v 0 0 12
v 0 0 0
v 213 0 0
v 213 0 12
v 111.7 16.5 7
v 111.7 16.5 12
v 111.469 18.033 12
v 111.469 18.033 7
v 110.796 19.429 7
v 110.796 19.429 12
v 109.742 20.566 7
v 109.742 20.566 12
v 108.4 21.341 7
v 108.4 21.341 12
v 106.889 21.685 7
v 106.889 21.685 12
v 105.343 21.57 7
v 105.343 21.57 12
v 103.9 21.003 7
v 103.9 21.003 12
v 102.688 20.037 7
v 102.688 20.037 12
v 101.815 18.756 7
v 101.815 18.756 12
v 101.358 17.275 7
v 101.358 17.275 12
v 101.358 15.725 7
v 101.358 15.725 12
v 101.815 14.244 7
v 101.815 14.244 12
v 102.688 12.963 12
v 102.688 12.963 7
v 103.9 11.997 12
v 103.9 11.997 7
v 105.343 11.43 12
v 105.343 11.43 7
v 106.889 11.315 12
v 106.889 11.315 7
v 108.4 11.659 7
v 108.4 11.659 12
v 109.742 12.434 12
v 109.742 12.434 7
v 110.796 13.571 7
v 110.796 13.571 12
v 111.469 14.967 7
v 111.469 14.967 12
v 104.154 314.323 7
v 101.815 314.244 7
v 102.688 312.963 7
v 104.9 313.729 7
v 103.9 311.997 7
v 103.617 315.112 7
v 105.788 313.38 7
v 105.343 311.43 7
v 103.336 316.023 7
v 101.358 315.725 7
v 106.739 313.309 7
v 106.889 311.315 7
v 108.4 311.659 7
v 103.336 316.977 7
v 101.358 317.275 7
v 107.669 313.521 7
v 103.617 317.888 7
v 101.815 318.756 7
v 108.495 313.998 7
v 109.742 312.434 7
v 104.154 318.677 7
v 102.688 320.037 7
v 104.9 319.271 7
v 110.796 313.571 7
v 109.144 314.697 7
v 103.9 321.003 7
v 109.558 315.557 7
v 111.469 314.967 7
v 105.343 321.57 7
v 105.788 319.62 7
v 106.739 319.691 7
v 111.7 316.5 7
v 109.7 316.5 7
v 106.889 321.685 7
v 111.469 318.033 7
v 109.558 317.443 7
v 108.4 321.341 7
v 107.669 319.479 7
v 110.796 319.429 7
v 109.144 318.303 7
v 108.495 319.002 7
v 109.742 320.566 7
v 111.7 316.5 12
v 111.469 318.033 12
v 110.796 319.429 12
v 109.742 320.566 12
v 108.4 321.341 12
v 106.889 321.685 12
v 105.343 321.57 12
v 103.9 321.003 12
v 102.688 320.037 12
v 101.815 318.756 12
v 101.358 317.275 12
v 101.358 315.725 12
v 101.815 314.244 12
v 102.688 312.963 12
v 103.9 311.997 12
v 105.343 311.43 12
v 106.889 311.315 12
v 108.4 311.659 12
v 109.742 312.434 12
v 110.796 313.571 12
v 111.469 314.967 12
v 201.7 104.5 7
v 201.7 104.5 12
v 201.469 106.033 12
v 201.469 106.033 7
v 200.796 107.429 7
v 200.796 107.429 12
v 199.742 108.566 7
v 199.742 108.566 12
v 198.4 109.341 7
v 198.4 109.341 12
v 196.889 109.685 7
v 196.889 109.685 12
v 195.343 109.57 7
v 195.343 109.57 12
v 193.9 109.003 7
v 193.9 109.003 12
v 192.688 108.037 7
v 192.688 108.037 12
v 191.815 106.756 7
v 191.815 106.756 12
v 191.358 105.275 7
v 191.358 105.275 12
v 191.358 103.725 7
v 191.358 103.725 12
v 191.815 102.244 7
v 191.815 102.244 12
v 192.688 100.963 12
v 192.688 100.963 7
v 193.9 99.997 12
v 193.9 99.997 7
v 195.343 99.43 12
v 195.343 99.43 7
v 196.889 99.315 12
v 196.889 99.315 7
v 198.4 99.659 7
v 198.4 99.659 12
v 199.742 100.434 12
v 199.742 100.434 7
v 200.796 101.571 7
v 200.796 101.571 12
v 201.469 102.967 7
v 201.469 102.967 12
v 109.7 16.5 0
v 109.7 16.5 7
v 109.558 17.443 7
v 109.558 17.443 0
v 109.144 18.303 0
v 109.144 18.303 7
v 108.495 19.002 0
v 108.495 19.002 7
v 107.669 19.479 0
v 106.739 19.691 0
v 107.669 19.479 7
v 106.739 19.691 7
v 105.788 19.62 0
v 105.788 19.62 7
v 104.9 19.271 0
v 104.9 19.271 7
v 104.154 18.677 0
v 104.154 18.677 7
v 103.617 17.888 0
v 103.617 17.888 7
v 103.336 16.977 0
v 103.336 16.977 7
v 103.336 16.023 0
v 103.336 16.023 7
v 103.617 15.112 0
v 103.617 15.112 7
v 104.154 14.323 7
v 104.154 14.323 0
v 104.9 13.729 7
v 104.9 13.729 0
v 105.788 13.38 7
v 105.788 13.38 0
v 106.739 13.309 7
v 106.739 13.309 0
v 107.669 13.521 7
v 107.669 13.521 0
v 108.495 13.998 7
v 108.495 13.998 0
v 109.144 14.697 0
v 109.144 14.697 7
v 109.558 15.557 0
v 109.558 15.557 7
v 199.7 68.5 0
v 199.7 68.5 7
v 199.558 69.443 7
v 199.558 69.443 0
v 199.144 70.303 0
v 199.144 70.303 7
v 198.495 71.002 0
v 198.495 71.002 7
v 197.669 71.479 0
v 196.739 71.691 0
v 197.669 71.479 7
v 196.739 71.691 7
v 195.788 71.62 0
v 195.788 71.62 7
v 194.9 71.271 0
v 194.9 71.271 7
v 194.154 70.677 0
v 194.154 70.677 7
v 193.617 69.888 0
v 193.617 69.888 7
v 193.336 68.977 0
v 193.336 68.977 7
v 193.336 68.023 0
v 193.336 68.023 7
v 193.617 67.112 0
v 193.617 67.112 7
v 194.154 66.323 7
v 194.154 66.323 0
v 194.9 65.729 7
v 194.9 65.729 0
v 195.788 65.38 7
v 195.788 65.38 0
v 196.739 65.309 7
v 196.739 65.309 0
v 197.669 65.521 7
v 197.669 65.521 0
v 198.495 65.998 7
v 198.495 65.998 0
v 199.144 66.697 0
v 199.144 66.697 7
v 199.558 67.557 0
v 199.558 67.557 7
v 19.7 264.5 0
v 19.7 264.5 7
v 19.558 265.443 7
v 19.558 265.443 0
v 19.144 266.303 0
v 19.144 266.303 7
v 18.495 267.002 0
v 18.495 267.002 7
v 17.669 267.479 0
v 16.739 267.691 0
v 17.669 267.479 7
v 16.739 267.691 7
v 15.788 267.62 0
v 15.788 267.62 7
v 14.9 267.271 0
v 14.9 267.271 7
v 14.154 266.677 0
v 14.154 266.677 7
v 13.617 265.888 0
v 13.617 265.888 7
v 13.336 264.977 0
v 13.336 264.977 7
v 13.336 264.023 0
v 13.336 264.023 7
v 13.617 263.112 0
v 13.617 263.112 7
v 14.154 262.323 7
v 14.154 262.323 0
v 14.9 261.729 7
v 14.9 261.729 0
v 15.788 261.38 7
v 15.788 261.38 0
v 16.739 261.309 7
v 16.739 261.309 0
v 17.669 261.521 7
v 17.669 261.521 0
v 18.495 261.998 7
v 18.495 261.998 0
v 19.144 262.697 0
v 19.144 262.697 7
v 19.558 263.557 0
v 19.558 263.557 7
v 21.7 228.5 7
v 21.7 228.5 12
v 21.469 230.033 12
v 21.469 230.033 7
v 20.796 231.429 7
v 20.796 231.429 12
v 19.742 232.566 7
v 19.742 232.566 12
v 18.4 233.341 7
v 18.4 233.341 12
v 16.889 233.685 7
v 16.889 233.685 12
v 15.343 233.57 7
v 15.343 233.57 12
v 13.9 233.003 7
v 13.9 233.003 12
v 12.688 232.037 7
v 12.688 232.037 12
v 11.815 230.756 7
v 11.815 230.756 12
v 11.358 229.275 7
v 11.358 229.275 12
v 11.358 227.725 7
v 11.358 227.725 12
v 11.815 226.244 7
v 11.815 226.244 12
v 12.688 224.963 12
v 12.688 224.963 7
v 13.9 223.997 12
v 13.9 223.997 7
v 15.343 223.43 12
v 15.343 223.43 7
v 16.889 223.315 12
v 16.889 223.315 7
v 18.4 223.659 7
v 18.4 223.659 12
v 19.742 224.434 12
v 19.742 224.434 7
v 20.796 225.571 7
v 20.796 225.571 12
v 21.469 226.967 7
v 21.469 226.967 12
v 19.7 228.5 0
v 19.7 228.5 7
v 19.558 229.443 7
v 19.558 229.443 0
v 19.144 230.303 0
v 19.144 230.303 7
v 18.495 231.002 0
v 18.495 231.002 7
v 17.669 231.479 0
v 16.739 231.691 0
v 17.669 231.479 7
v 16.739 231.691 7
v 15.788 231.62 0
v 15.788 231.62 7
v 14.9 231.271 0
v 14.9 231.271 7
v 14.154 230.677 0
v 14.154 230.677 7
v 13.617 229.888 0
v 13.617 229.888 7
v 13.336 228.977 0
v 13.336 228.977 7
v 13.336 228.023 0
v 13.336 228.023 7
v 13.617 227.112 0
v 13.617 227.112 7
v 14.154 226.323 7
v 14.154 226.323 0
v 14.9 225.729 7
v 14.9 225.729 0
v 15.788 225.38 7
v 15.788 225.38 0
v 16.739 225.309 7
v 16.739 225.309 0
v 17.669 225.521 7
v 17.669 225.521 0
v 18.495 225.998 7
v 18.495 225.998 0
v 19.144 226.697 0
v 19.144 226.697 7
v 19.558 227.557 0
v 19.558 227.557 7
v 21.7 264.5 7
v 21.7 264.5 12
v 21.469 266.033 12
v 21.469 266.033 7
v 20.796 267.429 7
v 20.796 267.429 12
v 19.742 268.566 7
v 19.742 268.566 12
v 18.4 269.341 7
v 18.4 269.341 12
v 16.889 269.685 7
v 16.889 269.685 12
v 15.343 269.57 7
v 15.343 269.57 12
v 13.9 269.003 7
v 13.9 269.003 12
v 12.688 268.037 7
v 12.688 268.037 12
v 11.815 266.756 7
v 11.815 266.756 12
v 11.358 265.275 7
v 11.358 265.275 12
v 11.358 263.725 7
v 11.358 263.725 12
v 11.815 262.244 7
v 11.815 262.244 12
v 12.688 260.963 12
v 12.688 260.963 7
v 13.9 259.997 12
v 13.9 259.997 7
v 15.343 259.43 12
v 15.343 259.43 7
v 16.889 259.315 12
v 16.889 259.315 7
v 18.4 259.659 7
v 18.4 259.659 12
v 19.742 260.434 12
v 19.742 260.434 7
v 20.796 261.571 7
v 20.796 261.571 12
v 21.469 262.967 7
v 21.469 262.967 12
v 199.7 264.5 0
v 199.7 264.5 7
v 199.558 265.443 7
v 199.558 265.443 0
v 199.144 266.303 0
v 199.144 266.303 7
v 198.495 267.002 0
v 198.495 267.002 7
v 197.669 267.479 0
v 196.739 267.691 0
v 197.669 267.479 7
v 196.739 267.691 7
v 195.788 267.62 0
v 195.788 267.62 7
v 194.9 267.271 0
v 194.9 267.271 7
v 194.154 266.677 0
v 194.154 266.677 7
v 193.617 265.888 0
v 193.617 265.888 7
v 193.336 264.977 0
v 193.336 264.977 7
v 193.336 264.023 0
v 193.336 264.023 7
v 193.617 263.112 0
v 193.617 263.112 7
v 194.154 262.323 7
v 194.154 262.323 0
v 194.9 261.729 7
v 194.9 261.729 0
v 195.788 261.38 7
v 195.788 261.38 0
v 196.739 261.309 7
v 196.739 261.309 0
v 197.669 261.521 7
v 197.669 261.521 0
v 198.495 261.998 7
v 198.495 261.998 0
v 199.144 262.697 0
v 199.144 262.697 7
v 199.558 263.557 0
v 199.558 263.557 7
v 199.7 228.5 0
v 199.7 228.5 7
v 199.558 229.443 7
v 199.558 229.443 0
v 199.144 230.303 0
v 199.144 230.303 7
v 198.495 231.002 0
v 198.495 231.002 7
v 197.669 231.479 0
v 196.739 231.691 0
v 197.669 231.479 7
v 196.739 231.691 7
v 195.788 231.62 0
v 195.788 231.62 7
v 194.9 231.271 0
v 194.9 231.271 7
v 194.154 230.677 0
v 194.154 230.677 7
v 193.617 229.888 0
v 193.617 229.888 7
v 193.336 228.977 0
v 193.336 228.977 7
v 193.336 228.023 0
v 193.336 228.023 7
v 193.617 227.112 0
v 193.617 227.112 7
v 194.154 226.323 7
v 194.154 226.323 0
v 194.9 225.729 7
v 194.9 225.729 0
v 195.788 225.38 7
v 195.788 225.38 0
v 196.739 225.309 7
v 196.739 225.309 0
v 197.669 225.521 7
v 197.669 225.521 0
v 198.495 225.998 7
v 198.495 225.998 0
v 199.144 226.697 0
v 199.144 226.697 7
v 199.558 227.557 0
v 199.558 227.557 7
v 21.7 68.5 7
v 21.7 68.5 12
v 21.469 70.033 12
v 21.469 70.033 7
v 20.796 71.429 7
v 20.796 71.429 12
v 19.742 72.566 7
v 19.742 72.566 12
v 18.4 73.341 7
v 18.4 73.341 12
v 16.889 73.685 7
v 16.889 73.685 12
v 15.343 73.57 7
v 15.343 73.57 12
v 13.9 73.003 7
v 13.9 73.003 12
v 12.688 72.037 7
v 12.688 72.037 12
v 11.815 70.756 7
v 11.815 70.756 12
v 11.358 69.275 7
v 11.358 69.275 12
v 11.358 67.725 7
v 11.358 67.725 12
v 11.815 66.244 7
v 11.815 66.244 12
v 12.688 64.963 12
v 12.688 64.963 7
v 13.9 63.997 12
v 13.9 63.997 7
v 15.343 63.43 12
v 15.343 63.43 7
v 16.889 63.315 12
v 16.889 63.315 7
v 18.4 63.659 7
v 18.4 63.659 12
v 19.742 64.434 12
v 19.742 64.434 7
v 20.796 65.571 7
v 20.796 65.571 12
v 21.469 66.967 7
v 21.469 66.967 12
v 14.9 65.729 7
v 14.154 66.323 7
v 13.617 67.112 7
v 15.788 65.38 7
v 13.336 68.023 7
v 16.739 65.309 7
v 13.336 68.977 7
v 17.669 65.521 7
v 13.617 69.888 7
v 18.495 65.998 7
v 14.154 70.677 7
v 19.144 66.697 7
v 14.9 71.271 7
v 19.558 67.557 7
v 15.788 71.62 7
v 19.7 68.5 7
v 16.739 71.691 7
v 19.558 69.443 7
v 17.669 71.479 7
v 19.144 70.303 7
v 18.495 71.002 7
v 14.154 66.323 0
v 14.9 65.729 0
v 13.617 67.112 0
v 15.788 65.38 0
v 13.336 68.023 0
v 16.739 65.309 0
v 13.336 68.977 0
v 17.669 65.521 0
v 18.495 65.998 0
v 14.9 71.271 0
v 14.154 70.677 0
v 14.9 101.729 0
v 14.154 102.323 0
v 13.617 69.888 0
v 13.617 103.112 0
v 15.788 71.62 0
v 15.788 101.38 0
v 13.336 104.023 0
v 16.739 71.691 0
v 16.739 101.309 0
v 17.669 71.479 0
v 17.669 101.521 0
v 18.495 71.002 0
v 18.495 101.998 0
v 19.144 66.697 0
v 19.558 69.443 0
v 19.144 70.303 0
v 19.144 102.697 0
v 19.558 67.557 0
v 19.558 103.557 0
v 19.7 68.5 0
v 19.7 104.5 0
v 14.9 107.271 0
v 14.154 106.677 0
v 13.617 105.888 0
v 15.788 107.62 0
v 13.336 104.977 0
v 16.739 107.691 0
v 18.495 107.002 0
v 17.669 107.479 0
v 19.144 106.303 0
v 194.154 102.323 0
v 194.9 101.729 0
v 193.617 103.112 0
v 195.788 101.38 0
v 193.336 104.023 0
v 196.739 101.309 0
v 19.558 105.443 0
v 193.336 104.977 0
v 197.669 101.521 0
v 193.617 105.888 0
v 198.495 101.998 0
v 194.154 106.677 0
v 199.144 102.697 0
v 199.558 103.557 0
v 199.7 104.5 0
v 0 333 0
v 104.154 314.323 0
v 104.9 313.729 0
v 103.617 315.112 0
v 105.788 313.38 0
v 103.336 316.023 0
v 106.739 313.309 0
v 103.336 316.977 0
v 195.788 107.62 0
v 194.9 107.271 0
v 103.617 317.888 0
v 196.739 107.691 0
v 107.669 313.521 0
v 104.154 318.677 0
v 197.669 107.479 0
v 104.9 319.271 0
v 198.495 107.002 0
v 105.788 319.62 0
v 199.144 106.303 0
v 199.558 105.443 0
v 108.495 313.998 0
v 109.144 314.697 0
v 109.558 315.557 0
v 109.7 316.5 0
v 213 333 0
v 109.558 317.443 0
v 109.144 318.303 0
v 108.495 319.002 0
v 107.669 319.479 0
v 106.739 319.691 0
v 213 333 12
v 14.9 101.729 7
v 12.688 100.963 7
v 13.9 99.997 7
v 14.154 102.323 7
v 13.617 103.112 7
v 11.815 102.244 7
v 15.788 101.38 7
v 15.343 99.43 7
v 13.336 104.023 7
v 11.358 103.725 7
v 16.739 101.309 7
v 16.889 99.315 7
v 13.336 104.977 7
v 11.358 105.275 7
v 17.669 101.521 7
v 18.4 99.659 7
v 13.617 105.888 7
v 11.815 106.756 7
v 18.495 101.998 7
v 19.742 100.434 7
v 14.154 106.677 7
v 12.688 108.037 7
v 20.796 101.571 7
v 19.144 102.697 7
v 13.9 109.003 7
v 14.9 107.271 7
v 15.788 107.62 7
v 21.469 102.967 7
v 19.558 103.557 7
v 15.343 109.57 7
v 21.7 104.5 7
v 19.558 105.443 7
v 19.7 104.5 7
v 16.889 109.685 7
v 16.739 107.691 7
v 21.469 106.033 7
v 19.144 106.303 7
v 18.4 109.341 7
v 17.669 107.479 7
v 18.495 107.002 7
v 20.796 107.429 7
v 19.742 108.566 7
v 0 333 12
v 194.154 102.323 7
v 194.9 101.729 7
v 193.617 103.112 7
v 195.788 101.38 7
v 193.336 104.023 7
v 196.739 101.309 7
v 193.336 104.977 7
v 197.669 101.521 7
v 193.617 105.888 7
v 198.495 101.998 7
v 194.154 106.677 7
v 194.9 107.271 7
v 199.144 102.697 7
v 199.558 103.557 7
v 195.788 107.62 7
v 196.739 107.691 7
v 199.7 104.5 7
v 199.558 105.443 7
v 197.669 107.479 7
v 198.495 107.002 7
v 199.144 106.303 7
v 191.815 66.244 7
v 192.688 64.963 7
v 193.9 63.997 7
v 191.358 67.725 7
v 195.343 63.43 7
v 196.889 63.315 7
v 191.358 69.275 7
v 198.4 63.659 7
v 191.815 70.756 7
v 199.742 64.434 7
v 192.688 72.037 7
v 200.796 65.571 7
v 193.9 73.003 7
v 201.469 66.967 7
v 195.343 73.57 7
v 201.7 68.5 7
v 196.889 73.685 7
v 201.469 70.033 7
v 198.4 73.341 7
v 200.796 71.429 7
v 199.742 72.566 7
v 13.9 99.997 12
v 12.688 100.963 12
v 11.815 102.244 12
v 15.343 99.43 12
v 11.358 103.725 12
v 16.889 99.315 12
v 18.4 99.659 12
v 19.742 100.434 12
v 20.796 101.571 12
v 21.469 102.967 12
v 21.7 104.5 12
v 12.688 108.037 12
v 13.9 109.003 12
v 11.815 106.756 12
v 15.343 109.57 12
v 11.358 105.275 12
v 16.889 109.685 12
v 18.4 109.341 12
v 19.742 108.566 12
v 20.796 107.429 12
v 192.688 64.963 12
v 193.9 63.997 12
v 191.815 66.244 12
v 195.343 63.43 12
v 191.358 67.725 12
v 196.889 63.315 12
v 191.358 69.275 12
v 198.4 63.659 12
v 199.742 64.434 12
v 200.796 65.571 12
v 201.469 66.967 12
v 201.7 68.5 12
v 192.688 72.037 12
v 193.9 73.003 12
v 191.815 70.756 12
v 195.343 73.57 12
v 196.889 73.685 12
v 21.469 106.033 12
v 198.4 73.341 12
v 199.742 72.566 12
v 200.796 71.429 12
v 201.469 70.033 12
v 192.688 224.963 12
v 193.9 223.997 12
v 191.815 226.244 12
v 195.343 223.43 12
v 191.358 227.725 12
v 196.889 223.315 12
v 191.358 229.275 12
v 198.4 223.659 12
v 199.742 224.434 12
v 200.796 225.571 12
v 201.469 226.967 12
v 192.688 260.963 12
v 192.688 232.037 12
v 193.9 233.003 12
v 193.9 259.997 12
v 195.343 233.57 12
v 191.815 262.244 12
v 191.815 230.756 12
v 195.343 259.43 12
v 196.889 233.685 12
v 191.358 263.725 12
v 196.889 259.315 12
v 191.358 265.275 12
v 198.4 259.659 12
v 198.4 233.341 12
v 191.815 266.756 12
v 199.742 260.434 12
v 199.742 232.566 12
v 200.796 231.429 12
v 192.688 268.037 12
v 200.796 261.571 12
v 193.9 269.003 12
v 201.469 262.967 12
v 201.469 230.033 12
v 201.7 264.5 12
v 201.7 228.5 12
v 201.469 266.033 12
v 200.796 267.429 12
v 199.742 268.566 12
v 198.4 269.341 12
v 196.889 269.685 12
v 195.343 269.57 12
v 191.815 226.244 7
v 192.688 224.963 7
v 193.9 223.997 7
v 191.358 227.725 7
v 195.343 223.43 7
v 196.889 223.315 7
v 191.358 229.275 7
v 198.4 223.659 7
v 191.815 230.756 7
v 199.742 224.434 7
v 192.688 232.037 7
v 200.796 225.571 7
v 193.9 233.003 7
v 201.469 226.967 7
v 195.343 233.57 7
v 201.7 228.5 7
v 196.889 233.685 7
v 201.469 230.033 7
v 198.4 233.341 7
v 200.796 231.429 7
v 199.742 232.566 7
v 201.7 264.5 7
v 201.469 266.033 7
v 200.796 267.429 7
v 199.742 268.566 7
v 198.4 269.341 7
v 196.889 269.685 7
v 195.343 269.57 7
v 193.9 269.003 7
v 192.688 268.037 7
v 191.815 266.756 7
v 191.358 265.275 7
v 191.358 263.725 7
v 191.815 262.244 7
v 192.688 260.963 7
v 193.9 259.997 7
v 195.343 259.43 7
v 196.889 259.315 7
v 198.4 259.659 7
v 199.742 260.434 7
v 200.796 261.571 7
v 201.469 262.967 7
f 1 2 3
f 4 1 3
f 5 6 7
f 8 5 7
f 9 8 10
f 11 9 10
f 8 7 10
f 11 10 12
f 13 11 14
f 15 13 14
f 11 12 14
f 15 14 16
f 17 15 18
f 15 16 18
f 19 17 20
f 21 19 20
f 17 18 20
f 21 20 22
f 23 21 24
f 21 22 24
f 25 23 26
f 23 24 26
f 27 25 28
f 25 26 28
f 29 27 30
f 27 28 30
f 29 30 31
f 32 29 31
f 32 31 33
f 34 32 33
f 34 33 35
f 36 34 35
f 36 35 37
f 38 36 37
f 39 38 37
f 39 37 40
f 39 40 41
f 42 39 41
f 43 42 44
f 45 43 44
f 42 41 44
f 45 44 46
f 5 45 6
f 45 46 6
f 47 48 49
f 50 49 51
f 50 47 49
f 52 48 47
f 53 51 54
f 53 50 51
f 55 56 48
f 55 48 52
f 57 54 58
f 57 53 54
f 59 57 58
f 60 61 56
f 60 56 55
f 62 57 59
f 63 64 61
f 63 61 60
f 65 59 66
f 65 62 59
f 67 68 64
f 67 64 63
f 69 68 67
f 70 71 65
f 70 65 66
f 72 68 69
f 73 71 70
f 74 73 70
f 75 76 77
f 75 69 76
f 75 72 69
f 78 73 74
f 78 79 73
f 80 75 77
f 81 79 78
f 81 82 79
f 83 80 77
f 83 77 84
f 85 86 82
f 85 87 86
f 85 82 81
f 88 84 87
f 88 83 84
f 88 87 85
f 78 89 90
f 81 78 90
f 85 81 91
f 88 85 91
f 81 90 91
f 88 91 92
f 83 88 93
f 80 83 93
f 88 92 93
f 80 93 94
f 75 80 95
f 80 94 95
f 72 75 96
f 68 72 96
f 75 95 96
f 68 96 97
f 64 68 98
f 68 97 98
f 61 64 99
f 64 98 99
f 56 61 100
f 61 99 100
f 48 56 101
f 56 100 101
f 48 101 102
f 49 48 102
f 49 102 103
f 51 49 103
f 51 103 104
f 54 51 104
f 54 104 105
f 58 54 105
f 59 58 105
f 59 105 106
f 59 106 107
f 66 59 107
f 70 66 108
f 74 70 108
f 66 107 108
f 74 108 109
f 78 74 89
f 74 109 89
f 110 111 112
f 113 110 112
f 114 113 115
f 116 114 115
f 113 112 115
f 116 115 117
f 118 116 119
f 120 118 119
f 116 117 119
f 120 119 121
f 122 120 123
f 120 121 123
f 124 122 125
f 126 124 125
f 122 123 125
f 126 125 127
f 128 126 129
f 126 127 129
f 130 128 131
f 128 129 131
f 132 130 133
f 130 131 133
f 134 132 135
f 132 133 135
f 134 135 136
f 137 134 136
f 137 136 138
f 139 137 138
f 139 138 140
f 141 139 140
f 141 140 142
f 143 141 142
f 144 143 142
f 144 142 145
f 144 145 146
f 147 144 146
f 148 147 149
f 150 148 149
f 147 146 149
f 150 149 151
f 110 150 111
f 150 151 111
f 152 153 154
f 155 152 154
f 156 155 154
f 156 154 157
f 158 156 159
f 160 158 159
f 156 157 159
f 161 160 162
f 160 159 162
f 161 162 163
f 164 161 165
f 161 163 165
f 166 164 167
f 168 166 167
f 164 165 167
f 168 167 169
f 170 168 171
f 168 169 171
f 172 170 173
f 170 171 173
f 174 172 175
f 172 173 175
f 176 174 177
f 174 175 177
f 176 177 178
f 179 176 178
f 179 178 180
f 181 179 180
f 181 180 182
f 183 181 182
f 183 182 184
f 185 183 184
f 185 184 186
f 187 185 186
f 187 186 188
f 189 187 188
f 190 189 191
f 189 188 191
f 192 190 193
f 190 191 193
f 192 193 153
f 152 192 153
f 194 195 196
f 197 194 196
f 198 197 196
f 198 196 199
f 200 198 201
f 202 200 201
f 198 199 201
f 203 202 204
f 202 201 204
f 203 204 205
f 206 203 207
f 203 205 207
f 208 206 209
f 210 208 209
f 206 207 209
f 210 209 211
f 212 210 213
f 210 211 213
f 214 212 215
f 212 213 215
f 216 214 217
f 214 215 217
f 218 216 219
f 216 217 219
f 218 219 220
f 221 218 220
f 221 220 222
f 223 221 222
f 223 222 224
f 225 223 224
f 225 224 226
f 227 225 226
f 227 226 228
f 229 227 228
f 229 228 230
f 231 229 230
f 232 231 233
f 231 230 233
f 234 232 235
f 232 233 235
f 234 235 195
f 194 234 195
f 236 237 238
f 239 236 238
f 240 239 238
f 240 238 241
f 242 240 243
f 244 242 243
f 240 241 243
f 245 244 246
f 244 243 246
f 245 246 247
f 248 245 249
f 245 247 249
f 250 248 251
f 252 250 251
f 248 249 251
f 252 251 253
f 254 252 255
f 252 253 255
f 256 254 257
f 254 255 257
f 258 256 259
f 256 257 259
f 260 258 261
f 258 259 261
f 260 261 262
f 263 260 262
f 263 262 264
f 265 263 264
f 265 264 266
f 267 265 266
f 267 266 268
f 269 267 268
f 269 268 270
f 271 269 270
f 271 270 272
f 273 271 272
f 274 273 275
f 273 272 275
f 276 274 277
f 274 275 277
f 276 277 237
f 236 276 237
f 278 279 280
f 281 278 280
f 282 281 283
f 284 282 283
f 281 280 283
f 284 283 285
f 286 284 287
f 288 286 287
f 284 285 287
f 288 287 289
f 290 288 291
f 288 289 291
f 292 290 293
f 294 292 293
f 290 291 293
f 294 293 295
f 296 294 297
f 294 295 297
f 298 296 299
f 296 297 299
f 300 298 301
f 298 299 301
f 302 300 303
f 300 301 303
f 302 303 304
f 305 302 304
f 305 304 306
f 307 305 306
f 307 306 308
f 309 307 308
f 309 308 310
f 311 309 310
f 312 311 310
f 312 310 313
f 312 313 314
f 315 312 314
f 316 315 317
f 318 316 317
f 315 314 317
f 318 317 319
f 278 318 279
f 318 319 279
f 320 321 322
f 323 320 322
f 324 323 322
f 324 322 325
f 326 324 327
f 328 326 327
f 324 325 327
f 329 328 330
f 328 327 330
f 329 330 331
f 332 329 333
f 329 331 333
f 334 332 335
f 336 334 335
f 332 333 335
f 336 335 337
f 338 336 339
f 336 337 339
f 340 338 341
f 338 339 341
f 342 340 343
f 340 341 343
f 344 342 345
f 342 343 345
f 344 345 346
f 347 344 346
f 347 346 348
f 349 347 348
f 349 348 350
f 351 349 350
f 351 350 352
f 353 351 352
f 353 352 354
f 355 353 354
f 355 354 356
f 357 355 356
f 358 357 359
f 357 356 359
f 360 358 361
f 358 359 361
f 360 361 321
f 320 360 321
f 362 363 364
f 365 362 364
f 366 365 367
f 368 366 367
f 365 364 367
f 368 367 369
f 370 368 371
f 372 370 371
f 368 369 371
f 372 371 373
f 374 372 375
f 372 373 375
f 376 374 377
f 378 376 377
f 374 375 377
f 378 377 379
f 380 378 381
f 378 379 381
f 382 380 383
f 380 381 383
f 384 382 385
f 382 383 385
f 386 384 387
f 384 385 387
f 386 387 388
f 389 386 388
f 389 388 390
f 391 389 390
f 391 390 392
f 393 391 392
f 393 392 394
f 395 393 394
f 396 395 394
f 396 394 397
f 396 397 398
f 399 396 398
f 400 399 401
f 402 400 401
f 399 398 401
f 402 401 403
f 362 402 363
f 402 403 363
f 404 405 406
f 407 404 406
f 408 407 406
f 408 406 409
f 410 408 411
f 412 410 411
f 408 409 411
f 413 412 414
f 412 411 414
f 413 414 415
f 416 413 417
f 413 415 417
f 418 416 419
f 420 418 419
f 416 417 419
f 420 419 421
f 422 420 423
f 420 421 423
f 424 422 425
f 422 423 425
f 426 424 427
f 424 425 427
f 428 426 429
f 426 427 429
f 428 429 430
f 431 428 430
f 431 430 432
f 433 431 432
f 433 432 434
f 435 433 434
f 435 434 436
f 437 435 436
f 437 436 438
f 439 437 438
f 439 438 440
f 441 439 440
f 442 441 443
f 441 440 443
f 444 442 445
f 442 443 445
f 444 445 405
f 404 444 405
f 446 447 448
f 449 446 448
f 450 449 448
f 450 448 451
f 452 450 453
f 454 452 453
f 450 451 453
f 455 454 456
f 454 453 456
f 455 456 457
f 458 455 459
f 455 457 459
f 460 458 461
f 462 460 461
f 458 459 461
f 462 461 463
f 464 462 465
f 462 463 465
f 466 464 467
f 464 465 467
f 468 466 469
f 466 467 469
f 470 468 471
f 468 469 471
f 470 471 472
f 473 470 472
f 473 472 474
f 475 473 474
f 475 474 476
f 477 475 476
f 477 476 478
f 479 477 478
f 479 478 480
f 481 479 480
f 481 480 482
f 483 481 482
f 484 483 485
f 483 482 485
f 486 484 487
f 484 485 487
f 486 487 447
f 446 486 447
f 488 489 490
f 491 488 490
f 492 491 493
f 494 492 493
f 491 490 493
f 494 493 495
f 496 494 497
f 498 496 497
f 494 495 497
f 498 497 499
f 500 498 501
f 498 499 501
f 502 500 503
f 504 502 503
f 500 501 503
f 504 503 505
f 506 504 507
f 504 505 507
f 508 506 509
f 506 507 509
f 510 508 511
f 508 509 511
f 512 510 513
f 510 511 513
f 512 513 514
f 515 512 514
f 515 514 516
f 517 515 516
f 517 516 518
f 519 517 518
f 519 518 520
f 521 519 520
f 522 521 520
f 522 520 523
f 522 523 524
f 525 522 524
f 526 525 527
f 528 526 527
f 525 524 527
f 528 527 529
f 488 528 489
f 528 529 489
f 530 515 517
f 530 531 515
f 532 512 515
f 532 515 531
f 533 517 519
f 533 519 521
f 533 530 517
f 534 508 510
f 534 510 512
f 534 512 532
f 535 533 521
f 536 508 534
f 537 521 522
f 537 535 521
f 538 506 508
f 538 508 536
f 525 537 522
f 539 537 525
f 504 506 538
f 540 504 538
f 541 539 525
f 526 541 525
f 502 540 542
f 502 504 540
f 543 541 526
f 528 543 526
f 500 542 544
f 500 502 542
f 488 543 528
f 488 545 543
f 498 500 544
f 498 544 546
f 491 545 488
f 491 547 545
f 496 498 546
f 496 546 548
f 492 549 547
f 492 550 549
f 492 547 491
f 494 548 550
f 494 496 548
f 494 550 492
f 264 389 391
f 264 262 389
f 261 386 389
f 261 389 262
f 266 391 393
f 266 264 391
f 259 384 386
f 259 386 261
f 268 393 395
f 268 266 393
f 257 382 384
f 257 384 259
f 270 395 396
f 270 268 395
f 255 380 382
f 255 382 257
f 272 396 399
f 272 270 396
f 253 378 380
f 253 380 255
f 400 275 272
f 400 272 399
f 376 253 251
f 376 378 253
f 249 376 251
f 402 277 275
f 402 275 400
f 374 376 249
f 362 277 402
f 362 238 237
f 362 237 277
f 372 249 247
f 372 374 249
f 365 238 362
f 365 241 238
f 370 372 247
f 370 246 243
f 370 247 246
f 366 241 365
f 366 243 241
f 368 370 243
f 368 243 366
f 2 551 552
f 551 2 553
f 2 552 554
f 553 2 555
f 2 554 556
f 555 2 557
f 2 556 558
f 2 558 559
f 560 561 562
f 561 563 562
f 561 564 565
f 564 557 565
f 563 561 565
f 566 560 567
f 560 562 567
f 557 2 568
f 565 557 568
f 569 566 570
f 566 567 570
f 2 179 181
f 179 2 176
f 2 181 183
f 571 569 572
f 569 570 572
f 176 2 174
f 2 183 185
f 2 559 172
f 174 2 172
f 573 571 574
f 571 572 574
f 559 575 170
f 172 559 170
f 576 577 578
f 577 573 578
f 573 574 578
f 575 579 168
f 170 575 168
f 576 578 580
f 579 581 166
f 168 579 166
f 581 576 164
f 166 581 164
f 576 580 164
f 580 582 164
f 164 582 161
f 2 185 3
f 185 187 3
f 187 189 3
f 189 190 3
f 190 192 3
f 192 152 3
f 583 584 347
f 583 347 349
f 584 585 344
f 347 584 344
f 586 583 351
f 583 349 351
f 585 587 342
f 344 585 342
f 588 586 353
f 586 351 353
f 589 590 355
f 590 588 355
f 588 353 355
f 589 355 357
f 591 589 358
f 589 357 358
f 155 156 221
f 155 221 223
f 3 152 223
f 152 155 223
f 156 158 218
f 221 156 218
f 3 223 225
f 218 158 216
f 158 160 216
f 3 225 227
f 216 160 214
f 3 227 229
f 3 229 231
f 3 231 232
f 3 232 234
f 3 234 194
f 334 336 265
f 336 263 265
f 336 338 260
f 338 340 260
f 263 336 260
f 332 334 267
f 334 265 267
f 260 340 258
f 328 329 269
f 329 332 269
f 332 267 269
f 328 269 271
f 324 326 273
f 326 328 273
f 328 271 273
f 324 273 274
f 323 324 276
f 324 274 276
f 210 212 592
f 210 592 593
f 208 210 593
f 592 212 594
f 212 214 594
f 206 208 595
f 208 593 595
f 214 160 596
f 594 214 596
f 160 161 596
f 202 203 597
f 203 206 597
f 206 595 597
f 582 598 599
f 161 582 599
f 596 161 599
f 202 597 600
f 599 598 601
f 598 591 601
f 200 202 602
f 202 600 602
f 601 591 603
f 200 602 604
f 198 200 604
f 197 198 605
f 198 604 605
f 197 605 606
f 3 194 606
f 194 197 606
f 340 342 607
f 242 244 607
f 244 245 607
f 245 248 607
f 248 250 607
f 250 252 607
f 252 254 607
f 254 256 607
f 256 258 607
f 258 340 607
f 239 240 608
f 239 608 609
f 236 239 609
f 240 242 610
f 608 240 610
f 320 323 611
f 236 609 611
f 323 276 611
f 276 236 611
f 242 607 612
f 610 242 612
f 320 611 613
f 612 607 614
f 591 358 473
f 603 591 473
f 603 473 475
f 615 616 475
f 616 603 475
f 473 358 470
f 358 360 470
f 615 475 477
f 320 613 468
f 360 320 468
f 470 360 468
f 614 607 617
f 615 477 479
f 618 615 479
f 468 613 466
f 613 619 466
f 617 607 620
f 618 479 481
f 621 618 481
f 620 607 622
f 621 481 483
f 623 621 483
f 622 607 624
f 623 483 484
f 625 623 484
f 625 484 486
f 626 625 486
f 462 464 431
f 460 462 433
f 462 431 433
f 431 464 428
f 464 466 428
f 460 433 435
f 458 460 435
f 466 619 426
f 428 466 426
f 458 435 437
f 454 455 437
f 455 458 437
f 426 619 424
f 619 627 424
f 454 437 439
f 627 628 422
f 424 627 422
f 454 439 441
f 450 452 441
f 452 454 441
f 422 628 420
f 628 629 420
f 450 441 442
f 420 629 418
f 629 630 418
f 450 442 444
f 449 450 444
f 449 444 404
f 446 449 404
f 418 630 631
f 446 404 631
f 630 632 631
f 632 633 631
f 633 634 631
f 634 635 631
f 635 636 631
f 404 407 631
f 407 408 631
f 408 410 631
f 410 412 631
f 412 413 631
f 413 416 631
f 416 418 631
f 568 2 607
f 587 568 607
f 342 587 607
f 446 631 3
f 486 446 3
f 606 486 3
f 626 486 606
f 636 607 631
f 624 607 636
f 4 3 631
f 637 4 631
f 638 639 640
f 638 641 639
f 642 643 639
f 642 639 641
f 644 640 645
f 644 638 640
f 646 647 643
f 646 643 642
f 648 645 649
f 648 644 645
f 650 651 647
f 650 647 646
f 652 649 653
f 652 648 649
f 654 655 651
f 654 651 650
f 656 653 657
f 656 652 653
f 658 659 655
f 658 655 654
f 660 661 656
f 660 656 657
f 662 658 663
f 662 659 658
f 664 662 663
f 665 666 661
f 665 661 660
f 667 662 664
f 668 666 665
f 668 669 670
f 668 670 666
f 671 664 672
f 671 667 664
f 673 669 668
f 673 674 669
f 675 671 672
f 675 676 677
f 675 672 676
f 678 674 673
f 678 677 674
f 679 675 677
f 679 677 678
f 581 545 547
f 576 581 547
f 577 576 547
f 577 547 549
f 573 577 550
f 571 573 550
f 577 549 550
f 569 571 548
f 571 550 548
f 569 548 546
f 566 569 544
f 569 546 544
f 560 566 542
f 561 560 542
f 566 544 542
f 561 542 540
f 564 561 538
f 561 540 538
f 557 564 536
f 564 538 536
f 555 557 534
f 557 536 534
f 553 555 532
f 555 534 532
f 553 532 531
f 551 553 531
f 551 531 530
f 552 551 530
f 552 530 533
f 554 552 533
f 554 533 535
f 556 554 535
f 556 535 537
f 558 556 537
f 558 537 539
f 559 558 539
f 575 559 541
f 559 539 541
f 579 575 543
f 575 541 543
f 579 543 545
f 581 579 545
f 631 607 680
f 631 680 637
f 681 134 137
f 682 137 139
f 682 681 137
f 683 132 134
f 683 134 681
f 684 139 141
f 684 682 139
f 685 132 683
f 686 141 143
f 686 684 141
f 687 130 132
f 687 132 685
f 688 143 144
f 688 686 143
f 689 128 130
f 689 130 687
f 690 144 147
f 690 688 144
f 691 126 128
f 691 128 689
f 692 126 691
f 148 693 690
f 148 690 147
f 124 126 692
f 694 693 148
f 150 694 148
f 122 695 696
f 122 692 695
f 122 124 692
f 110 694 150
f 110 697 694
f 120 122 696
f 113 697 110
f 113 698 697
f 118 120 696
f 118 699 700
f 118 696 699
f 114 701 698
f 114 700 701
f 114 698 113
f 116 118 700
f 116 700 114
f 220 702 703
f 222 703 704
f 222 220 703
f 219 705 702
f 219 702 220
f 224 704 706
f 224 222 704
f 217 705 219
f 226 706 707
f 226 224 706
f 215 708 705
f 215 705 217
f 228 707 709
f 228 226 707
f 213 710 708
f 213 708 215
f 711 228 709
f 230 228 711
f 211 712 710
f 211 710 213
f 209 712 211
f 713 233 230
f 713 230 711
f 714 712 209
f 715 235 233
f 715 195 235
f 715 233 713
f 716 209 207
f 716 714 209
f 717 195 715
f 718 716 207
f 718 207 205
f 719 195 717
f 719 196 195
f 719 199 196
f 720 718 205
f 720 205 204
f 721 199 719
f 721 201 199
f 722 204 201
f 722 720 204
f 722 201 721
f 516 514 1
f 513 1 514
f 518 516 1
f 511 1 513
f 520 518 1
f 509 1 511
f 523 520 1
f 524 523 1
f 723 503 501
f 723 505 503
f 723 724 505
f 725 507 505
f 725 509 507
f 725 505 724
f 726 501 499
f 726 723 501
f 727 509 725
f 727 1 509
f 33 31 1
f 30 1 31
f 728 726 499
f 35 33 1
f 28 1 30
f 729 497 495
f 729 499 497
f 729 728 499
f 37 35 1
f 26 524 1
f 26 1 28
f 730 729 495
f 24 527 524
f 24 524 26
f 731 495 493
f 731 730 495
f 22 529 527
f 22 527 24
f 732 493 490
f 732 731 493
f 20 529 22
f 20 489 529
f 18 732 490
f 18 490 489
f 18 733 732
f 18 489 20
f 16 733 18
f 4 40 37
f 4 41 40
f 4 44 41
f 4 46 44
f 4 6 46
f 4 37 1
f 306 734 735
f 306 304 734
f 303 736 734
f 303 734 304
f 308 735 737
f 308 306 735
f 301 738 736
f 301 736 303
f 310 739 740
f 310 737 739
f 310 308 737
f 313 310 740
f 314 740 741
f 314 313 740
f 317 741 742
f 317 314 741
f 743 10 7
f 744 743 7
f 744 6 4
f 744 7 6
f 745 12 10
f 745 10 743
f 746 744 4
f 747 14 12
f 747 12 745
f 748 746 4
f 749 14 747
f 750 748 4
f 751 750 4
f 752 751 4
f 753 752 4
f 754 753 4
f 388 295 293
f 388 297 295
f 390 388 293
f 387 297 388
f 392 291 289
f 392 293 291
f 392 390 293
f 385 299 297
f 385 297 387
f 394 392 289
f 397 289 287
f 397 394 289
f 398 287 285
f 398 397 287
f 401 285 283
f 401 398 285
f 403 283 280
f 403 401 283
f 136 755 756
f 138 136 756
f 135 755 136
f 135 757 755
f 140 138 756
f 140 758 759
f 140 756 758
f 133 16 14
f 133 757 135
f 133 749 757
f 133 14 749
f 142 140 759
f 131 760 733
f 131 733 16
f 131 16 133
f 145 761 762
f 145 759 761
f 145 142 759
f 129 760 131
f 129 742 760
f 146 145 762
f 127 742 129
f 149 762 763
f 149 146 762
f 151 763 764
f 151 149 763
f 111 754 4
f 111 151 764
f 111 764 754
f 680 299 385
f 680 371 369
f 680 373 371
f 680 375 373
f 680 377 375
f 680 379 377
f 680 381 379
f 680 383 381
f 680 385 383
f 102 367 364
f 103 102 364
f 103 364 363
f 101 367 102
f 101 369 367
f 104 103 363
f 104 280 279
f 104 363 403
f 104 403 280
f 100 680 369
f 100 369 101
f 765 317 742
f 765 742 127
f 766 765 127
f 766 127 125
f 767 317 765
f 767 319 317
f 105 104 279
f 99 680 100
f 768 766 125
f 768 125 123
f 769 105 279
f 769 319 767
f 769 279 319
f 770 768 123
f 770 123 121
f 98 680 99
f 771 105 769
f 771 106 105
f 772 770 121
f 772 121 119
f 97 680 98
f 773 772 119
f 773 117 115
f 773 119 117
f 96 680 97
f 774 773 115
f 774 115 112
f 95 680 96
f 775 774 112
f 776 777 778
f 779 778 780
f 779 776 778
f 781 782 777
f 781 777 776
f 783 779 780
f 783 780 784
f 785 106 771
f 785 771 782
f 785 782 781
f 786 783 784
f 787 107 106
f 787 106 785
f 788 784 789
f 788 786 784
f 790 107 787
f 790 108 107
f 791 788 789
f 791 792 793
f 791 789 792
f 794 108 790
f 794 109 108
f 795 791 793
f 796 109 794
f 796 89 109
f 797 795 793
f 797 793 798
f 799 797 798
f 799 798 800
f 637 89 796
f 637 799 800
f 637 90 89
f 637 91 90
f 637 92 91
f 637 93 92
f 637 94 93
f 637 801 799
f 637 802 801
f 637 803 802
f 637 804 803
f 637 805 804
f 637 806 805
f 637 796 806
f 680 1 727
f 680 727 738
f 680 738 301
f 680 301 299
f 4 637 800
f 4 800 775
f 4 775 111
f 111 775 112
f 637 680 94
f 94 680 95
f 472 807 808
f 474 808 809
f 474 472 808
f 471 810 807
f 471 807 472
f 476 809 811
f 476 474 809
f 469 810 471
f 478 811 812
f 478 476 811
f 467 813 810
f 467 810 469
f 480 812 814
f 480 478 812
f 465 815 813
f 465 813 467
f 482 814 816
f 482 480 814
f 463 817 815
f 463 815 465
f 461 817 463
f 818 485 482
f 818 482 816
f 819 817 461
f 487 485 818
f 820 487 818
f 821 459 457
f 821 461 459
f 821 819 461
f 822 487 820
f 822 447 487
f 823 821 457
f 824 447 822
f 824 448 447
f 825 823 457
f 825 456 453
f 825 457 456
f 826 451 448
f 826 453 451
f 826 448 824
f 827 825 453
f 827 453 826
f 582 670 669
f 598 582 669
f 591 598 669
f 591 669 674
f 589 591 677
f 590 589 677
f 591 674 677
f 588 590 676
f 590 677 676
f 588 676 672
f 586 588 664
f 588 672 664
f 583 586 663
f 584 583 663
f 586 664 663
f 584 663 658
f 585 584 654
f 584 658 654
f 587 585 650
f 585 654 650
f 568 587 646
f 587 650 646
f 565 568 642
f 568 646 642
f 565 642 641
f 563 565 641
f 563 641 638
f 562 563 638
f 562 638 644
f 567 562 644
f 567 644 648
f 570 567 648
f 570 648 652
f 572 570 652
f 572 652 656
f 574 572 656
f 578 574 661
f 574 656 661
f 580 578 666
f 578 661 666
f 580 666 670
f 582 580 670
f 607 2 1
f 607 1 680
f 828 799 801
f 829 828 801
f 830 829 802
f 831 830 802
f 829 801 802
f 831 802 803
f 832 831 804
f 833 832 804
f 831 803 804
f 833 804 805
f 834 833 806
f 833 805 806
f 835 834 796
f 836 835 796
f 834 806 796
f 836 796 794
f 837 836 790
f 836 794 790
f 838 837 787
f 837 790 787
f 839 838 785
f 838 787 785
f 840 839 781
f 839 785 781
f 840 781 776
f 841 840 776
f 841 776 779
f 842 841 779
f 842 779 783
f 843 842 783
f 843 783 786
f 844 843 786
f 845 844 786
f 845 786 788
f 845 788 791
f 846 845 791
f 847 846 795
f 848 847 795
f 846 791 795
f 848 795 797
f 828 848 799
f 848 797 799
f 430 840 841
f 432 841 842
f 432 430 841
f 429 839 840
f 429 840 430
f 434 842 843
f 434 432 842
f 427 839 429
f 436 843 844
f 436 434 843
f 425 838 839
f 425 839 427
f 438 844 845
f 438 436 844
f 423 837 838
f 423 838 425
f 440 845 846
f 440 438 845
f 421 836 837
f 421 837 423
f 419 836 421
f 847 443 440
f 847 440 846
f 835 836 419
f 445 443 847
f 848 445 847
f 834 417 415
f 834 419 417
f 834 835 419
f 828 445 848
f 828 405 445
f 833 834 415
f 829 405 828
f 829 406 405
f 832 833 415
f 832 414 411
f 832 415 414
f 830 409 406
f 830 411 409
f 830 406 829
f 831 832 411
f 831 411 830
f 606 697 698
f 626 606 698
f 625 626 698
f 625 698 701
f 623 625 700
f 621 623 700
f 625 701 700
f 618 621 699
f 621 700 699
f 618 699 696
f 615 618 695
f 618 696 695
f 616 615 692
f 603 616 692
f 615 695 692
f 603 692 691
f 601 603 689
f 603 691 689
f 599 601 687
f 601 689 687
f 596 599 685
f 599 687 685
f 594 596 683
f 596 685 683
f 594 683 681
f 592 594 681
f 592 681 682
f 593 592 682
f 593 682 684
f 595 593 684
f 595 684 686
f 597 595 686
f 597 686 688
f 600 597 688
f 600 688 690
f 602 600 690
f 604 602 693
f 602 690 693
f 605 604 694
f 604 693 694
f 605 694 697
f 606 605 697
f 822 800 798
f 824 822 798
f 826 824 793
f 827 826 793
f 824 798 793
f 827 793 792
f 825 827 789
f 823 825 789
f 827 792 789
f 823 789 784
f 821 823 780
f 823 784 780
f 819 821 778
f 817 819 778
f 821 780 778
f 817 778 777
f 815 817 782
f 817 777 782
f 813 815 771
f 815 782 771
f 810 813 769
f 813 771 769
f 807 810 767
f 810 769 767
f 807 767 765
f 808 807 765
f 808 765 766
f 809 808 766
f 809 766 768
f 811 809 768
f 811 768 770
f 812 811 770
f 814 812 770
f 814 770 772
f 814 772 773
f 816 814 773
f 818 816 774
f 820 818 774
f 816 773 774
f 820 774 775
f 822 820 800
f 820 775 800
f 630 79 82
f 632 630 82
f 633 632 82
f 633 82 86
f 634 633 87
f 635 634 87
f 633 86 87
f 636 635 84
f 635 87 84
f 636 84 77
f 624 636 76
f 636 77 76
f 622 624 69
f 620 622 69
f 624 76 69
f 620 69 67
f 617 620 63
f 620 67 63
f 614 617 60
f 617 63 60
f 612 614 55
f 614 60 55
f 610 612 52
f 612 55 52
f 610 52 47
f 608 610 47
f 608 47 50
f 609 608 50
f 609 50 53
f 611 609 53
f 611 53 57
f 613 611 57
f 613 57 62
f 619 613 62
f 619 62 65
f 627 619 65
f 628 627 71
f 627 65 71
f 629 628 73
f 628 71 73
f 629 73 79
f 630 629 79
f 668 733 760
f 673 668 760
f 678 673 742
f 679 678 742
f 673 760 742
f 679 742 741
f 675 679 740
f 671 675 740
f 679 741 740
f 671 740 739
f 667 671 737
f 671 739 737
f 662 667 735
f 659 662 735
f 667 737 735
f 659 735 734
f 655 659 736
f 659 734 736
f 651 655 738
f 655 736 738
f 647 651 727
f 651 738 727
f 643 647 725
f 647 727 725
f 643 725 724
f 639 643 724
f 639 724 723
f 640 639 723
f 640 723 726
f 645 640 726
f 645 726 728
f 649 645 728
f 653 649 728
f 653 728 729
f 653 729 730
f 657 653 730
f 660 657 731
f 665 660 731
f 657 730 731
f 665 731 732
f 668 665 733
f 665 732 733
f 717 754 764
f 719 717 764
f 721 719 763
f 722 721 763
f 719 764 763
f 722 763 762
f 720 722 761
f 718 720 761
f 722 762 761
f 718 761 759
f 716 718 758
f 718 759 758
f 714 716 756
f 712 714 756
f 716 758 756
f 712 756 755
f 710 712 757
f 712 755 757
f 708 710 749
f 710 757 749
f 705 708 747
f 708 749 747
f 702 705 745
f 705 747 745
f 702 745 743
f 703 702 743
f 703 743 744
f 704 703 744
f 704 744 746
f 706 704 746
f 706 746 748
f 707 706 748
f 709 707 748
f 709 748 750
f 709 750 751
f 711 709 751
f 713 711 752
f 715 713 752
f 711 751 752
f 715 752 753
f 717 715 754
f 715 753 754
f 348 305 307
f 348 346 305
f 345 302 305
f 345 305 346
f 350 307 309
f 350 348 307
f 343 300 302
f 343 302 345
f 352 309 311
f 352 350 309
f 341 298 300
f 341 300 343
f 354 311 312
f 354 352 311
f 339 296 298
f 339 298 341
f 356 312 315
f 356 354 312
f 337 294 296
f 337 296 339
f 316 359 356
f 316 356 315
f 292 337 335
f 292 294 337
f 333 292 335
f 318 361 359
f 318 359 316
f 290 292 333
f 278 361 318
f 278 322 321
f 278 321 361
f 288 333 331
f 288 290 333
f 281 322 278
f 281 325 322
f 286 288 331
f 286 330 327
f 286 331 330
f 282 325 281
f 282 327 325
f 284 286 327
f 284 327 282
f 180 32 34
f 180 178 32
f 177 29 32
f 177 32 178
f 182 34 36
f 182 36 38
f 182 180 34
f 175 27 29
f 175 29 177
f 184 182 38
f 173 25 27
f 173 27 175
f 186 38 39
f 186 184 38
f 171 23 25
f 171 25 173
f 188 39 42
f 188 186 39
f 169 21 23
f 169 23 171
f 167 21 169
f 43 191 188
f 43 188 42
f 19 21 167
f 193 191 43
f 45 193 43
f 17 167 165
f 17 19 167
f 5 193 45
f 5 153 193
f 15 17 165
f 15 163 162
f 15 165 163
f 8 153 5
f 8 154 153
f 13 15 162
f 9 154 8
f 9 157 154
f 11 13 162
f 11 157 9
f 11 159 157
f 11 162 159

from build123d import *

# Parameters (mm, degrees)
SKETCH_W        = 213
SKETCH_H        = 333
PAD_DEPTH       = 12
SKETCH001_R     = 5.2
POCKET_DEPTH    = 5
SKETCH002_R     = 3.2
POCKET001_DEPTH = 7


with BuildPart() as part:
    # Sketch → Pad (new body)
    with BuildSketch(Plane.XY):
        with Locations((106.5, 166.5)):
            Rectangle(SKETCH_W, SKETCH_H)
    extrude(amount=PAD_DEPTH)

    # Sketch001 (on Face6 of Pad) → Pocket (cut)
    with BuildSketch(Plane.XY.offset(12)):
        with Locations((16.5, 264.5)):
            Circle(SKETCH001_R)
        with Locations((16.5, 228.5)):
            Circle(SKETCH001_R)
        with Locations((16.5, 104.5)):
            Circle(SKETCH001_R)
        with Locations((16.5, 68.5)):
            Circle(SKETCH001_R)
        with Locations((196.5, 264.5)):
            Circle(SKETCH001_R)
        with Locations((196.5, 228.5)):
            Circle(SKETCH001_R)
        with Locations((196.5, 104.5)):
            Circle(SKETCH001_R)
        with Locations((196.5, 68.5)):
            Circle(SKETCH001_R)
        with Locations((106.5, 316.5)):
            Circle(SKETCH001_R)
        with Locations((106.5, 16.5)):
            Circle(SKETCH001_R)
    extrude(amount=-POCKET_DEPTH, mode=Mode.SUBTRACT)

    # Sketch002 (on Face23 of Pocket) → Pocket001 (cut)
    with BuildSketch(Plane.XY.offset(7)):
        with Locations((106.5, 316.5)):
            Circle(SKETCH002_R)
        with Locations((16.5, 264.5)):
            Circle(SKETCH002_R)
        with Locations((16.5, 228.5)):
            Circle(SKETCH002_R)
        with Locations((16.5, 104.5)):
            Circle(SKETCH002_R)
        with Locations((16.5, 68.5)):
            Circle(SKETCH002_R)
        with Locations((106.5, 16.5)):
            Circle(SKETCH002_R)
        with Locations((196.5, 68.5)):
            Circle(SKETCH002_R)
        with Locations((196.5, 104.5)):
            Circle(SKETCH002_R)
        with Locations((196.5, 228.5)):
            Circle(SKETCH002_R)
        with Locations((196.5, 264.5)):
            Circle(SKETCH002_R)
    extrude(amount=-POCKET001_DEPTH, mode=Mode.SUBTRACT)


solid = part.part
